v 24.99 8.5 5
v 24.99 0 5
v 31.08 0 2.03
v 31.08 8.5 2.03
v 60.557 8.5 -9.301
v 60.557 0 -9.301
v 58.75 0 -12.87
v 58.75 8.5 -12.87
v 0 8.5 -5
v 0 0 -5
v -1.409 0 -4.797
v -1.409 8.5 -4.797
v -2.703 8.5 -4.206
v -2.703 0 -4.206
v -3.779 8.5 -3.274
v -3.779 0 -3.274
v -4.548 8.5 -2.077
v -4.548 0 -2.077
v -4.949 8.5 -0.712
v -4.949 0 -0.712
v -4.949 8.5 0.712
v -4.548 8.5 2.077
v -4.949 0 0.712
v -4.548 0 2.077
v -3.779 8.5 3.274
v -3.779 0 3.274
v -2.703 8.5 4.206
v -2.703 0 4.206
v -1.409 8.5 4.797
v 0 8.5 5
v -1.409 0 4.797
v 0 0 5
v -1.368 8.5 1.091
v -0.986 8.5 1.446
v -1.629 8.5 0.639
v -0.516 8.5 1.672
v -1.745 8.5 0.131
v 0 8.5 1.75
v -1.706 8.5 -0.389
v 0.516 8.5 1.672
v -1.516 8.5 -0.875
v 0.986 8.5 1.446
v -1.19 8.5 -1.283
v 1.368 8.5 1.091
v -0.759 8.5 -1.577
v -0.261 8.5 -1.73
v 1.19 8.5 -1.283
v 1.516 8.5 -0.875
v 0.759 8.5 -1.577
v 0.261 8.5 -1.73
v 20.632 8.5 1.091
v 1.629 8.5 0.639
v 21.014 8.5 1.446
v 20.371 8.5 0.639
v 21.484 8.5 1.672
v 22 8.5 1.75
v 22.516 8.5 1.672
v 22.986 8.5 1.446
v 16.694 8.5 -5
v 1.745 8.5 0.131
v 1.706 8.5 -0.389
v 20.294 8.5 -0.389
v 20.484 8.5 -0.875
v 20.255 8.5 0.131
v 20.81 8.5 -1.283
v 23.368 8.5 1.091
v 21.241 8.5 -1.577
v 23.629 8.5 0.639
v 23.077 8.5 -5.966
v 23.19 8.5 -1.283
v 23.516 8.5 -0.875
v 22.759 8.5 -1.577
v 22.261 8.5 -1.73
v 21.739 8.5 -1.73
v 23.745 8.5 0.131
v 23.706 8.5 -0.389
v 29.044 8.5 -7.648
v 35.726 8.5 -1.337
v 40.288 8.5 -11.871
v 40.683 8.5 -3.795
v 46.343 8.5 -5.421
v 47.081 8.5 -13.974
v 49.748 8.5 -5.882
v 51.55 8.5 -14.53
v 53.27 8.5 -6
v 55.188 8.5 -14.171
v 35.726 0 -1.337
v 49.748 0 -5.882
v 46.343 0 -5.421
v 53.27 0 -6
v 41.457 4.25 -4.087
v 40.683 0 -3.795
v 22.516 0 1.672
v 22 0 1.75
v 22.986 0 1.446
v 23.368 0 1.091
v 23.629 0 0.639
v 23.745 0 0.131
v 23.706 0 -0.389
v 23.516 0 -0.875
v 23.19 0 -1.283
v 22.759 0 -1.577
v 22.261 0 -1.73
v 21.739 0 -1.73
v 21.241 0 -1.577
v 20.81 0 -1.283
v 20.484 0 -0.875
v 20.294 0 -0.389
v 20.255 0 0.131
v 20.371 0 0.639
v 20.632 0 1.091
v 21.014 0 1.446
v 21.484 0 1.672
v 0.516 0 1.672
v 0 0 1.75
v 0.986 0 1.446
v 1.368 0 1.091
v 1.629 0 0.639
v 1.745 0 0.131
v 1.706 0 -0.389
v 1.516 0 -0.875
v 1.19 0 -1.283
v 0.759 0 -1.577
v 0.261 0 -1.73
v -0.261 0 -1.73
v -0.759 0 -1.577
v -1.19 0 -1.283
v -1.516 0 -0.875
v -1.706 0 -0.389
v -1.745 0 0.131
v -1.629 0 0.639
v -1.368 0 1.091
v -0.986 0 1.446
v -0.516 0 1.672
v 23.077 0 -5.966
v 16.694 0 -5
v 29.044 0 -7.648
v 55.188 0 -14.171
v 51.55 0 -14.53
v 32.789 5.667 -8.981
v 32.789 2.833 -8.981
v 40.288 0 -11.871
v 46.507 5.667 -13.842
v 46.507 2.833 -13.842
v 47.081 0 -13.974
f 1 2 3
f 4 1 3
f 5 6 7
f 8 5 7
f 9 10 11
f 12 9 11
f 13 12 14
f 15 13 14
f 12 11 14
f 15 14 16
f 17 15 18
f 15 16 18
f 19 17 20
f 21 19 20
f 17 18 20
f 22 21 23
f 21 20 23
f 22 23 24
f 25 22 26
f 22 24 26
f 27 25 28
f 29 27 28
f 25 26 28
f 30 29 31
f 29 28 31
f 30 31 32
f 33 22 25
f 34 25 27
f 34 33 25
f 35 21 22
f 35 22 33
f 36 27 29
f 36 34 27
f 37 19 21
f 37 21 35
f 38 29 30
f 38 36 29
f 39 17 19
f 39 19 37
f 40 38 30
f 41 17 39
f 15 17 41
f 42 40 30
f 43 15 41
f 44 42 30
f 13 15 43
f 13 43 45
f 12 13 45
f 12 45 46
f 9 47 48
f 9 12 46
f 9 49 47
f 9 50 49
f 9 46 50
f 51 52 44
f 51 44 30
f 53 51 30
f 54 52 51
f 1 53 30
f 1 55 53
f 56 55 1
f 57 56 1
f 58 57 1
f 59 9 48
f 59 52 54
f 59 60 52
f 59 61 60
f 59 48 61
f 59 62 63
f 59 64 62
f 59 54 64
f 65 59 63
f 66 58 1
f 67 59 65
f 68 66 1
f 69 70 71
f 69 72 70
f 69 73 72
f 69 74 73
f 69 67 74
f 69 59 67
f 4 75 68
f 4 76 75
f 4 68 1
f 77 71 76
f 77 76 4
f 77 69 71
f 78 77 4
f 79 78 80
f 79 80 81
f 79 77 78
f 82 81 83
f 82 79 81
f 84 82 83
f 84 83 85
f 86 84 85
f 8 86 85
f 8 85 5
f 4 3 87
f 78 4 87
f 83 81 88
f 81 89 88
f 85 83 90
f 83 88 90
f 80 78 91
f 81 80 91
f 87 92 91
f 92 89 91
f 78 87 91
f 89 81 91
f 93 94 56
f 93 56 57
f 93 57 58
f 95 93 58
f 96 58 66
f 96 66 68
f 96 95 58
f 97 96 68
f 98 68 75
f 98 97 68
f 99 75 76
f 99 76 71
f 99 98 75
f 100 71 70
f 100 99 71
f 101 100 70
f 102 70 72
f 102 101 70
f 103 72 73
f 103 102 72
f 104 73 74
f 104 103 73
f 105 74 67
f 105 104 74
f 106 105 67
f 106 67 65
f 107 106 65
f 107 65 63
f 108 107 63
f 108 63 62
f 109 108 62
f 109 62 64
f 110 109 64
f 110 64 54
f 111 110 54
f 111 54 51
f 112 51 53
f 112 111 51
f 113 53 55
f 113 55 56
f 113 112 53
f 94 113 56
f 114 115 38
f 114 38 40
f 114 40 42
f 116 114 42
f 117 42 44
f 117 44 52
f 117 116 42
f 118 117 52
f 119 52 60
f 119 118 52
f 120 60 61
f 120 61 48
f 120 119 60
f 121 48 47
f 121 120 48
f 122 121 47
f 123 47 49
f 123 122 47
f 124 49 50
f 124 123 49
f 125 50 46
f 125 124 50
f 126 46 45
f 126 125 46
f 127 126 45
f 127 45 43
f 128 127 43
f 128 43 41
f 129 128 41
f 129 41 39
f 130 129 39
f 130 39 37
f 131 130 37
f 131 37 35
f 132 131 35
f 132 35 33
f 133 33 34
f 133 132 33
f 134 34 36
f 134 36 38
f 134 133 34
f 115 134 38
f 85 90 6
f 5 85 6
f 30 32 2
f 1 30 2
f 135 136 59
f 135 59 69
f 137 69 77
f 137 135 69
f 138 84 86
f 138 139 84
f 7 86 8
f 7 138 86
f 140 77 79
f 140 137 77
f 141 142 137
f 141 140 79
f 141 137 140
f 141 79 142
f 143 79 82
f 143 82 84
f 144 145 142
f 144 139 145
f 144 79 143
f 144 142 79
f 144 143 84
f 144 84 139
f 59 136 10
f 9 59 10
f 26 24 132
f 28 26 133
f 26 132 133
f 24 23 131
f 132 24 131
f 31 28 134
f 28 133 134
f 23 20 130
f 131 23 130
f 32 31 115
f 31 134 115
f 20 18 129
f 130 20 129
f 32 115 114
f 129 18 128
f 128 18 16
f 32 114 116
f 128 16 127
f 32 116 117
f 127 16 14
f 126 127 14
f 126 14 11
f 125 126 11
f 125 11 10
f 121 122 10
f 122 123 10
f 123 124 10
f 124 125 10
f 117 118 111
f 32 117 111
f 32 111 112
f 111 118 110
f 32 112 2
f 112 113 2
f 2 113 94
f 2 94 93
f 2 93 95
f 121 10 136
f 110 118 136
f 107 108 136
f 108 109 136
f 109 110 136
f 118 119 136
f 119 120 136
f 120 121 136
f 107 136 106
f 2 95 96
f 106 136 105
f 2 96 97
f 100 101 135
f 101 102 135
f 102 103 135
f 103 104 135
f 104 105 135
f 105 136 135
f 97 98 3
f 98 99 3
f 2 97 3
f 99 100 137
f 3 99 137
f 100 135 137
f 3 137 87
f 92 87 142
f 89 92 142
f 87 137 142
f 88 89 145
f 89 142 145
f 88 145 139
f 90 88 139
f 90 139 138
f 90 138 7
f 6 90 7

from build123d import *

# Parameters (mm, degrees)
SKETCH1_R           = 5
SKETCH1_R_2         = 1.75
BOSS_EXTRUDE1_DEPTH = 8.5
BOSS_EXTRUDE2_START = -8.5
BOSS_EXTRUDE2_DEPTH = 8.5


with BuildPart() as part:
    # Sketch1 → Boss-Extrude1 (new body)
    # profile 1 of 3: a face of its own
    with BuildSketch(Plane(origin=(0, 0, 0), x_dir=(1, 0, 0), z_dir=(0, 1, 0))):
        Circle(SKETCH1_R)
        with Locations(Location((0, 0, 0), (0, 0, 270))):
            Circle(SKETCH1_R_2, mode=Mode.SUBTRACT)
    # profile 2 of 3: a face of its own
    with BuildSketch(Plane(origin=(0, 0, 0), x_dir=(1, 0, 0), z_dir=(0, 1, 0))):
        with BuildLine():
            Line((22, 5), (0, 5))
            ThreePointArc((0, 5), (3.535533906, 3.535533906), (5, 0))
            ThreePointArc((5, 0), (3.535533907, -3.535533905), (3e-09, -5))
            Line((3e-09, -5), (22, -5))
            ThreePointArc((22, -5), (17, 0), (22, 5))
        make_face()
    # profile 3 of 3: a face of its own
    with BuildSketch(Plane(origin=(0, 0, 0), x_dir=(1, 0, 0), z_dir=(0, 1, 0))):
        with Locations((22, 0)):
            Circle(SKETCH1_R)
        with Locations(Location((22, 0, 0), (0, 0, 270))):
            Circle(SKETCH1_R_2, mode=Mode.SUBTRACT)
    extrude(amount=BOSS_EXTRUDE1_DEPTH)

    # Sketch2 → Boss-Extrude2 (add)
    with BuildSketch(Plane(origin=(0, 8.5, 0), x_dir=(1, 0, 0), z_dir=(0, 1, 0)).offset(BOSS_EXTRUDE2_START)):
        with BuildLine():
            ThreePointArc((22, 5), (27, 0), (22, -5))
            Line((22, -5), (24.99, -5))
            Line((24.99, -5), (31.08, -2.029708536))
            add(Edge.make_bspline(
                [(31.08, -2.029708536), (40.738723452, 6.188270814), (53.27, 6)],
                knots=[0, 0, 0, 1, 1, 1], degree=2))
            Line((53.27, 6), (60.557013712, 9.301428655))
            Line((60.557013712, 9.301428655), (58.75, 12.87))
            add(Edge.make_bspline(
                [(16.693950363, 5), (34.27932275, 6.303745675), (46.942612852, 18.996556194), (58.75, 12.87)],
                knots=[0.094833199, 0.094833199, 0.094833199, 0.094833199, 1, 1, 1, 1], degree=3))
            Line((16.693950363, 5), (22, 5))
        make_face()
    extrude(amount=BOSS_EXTRUDE2_DEPTH)


solid = part.part
